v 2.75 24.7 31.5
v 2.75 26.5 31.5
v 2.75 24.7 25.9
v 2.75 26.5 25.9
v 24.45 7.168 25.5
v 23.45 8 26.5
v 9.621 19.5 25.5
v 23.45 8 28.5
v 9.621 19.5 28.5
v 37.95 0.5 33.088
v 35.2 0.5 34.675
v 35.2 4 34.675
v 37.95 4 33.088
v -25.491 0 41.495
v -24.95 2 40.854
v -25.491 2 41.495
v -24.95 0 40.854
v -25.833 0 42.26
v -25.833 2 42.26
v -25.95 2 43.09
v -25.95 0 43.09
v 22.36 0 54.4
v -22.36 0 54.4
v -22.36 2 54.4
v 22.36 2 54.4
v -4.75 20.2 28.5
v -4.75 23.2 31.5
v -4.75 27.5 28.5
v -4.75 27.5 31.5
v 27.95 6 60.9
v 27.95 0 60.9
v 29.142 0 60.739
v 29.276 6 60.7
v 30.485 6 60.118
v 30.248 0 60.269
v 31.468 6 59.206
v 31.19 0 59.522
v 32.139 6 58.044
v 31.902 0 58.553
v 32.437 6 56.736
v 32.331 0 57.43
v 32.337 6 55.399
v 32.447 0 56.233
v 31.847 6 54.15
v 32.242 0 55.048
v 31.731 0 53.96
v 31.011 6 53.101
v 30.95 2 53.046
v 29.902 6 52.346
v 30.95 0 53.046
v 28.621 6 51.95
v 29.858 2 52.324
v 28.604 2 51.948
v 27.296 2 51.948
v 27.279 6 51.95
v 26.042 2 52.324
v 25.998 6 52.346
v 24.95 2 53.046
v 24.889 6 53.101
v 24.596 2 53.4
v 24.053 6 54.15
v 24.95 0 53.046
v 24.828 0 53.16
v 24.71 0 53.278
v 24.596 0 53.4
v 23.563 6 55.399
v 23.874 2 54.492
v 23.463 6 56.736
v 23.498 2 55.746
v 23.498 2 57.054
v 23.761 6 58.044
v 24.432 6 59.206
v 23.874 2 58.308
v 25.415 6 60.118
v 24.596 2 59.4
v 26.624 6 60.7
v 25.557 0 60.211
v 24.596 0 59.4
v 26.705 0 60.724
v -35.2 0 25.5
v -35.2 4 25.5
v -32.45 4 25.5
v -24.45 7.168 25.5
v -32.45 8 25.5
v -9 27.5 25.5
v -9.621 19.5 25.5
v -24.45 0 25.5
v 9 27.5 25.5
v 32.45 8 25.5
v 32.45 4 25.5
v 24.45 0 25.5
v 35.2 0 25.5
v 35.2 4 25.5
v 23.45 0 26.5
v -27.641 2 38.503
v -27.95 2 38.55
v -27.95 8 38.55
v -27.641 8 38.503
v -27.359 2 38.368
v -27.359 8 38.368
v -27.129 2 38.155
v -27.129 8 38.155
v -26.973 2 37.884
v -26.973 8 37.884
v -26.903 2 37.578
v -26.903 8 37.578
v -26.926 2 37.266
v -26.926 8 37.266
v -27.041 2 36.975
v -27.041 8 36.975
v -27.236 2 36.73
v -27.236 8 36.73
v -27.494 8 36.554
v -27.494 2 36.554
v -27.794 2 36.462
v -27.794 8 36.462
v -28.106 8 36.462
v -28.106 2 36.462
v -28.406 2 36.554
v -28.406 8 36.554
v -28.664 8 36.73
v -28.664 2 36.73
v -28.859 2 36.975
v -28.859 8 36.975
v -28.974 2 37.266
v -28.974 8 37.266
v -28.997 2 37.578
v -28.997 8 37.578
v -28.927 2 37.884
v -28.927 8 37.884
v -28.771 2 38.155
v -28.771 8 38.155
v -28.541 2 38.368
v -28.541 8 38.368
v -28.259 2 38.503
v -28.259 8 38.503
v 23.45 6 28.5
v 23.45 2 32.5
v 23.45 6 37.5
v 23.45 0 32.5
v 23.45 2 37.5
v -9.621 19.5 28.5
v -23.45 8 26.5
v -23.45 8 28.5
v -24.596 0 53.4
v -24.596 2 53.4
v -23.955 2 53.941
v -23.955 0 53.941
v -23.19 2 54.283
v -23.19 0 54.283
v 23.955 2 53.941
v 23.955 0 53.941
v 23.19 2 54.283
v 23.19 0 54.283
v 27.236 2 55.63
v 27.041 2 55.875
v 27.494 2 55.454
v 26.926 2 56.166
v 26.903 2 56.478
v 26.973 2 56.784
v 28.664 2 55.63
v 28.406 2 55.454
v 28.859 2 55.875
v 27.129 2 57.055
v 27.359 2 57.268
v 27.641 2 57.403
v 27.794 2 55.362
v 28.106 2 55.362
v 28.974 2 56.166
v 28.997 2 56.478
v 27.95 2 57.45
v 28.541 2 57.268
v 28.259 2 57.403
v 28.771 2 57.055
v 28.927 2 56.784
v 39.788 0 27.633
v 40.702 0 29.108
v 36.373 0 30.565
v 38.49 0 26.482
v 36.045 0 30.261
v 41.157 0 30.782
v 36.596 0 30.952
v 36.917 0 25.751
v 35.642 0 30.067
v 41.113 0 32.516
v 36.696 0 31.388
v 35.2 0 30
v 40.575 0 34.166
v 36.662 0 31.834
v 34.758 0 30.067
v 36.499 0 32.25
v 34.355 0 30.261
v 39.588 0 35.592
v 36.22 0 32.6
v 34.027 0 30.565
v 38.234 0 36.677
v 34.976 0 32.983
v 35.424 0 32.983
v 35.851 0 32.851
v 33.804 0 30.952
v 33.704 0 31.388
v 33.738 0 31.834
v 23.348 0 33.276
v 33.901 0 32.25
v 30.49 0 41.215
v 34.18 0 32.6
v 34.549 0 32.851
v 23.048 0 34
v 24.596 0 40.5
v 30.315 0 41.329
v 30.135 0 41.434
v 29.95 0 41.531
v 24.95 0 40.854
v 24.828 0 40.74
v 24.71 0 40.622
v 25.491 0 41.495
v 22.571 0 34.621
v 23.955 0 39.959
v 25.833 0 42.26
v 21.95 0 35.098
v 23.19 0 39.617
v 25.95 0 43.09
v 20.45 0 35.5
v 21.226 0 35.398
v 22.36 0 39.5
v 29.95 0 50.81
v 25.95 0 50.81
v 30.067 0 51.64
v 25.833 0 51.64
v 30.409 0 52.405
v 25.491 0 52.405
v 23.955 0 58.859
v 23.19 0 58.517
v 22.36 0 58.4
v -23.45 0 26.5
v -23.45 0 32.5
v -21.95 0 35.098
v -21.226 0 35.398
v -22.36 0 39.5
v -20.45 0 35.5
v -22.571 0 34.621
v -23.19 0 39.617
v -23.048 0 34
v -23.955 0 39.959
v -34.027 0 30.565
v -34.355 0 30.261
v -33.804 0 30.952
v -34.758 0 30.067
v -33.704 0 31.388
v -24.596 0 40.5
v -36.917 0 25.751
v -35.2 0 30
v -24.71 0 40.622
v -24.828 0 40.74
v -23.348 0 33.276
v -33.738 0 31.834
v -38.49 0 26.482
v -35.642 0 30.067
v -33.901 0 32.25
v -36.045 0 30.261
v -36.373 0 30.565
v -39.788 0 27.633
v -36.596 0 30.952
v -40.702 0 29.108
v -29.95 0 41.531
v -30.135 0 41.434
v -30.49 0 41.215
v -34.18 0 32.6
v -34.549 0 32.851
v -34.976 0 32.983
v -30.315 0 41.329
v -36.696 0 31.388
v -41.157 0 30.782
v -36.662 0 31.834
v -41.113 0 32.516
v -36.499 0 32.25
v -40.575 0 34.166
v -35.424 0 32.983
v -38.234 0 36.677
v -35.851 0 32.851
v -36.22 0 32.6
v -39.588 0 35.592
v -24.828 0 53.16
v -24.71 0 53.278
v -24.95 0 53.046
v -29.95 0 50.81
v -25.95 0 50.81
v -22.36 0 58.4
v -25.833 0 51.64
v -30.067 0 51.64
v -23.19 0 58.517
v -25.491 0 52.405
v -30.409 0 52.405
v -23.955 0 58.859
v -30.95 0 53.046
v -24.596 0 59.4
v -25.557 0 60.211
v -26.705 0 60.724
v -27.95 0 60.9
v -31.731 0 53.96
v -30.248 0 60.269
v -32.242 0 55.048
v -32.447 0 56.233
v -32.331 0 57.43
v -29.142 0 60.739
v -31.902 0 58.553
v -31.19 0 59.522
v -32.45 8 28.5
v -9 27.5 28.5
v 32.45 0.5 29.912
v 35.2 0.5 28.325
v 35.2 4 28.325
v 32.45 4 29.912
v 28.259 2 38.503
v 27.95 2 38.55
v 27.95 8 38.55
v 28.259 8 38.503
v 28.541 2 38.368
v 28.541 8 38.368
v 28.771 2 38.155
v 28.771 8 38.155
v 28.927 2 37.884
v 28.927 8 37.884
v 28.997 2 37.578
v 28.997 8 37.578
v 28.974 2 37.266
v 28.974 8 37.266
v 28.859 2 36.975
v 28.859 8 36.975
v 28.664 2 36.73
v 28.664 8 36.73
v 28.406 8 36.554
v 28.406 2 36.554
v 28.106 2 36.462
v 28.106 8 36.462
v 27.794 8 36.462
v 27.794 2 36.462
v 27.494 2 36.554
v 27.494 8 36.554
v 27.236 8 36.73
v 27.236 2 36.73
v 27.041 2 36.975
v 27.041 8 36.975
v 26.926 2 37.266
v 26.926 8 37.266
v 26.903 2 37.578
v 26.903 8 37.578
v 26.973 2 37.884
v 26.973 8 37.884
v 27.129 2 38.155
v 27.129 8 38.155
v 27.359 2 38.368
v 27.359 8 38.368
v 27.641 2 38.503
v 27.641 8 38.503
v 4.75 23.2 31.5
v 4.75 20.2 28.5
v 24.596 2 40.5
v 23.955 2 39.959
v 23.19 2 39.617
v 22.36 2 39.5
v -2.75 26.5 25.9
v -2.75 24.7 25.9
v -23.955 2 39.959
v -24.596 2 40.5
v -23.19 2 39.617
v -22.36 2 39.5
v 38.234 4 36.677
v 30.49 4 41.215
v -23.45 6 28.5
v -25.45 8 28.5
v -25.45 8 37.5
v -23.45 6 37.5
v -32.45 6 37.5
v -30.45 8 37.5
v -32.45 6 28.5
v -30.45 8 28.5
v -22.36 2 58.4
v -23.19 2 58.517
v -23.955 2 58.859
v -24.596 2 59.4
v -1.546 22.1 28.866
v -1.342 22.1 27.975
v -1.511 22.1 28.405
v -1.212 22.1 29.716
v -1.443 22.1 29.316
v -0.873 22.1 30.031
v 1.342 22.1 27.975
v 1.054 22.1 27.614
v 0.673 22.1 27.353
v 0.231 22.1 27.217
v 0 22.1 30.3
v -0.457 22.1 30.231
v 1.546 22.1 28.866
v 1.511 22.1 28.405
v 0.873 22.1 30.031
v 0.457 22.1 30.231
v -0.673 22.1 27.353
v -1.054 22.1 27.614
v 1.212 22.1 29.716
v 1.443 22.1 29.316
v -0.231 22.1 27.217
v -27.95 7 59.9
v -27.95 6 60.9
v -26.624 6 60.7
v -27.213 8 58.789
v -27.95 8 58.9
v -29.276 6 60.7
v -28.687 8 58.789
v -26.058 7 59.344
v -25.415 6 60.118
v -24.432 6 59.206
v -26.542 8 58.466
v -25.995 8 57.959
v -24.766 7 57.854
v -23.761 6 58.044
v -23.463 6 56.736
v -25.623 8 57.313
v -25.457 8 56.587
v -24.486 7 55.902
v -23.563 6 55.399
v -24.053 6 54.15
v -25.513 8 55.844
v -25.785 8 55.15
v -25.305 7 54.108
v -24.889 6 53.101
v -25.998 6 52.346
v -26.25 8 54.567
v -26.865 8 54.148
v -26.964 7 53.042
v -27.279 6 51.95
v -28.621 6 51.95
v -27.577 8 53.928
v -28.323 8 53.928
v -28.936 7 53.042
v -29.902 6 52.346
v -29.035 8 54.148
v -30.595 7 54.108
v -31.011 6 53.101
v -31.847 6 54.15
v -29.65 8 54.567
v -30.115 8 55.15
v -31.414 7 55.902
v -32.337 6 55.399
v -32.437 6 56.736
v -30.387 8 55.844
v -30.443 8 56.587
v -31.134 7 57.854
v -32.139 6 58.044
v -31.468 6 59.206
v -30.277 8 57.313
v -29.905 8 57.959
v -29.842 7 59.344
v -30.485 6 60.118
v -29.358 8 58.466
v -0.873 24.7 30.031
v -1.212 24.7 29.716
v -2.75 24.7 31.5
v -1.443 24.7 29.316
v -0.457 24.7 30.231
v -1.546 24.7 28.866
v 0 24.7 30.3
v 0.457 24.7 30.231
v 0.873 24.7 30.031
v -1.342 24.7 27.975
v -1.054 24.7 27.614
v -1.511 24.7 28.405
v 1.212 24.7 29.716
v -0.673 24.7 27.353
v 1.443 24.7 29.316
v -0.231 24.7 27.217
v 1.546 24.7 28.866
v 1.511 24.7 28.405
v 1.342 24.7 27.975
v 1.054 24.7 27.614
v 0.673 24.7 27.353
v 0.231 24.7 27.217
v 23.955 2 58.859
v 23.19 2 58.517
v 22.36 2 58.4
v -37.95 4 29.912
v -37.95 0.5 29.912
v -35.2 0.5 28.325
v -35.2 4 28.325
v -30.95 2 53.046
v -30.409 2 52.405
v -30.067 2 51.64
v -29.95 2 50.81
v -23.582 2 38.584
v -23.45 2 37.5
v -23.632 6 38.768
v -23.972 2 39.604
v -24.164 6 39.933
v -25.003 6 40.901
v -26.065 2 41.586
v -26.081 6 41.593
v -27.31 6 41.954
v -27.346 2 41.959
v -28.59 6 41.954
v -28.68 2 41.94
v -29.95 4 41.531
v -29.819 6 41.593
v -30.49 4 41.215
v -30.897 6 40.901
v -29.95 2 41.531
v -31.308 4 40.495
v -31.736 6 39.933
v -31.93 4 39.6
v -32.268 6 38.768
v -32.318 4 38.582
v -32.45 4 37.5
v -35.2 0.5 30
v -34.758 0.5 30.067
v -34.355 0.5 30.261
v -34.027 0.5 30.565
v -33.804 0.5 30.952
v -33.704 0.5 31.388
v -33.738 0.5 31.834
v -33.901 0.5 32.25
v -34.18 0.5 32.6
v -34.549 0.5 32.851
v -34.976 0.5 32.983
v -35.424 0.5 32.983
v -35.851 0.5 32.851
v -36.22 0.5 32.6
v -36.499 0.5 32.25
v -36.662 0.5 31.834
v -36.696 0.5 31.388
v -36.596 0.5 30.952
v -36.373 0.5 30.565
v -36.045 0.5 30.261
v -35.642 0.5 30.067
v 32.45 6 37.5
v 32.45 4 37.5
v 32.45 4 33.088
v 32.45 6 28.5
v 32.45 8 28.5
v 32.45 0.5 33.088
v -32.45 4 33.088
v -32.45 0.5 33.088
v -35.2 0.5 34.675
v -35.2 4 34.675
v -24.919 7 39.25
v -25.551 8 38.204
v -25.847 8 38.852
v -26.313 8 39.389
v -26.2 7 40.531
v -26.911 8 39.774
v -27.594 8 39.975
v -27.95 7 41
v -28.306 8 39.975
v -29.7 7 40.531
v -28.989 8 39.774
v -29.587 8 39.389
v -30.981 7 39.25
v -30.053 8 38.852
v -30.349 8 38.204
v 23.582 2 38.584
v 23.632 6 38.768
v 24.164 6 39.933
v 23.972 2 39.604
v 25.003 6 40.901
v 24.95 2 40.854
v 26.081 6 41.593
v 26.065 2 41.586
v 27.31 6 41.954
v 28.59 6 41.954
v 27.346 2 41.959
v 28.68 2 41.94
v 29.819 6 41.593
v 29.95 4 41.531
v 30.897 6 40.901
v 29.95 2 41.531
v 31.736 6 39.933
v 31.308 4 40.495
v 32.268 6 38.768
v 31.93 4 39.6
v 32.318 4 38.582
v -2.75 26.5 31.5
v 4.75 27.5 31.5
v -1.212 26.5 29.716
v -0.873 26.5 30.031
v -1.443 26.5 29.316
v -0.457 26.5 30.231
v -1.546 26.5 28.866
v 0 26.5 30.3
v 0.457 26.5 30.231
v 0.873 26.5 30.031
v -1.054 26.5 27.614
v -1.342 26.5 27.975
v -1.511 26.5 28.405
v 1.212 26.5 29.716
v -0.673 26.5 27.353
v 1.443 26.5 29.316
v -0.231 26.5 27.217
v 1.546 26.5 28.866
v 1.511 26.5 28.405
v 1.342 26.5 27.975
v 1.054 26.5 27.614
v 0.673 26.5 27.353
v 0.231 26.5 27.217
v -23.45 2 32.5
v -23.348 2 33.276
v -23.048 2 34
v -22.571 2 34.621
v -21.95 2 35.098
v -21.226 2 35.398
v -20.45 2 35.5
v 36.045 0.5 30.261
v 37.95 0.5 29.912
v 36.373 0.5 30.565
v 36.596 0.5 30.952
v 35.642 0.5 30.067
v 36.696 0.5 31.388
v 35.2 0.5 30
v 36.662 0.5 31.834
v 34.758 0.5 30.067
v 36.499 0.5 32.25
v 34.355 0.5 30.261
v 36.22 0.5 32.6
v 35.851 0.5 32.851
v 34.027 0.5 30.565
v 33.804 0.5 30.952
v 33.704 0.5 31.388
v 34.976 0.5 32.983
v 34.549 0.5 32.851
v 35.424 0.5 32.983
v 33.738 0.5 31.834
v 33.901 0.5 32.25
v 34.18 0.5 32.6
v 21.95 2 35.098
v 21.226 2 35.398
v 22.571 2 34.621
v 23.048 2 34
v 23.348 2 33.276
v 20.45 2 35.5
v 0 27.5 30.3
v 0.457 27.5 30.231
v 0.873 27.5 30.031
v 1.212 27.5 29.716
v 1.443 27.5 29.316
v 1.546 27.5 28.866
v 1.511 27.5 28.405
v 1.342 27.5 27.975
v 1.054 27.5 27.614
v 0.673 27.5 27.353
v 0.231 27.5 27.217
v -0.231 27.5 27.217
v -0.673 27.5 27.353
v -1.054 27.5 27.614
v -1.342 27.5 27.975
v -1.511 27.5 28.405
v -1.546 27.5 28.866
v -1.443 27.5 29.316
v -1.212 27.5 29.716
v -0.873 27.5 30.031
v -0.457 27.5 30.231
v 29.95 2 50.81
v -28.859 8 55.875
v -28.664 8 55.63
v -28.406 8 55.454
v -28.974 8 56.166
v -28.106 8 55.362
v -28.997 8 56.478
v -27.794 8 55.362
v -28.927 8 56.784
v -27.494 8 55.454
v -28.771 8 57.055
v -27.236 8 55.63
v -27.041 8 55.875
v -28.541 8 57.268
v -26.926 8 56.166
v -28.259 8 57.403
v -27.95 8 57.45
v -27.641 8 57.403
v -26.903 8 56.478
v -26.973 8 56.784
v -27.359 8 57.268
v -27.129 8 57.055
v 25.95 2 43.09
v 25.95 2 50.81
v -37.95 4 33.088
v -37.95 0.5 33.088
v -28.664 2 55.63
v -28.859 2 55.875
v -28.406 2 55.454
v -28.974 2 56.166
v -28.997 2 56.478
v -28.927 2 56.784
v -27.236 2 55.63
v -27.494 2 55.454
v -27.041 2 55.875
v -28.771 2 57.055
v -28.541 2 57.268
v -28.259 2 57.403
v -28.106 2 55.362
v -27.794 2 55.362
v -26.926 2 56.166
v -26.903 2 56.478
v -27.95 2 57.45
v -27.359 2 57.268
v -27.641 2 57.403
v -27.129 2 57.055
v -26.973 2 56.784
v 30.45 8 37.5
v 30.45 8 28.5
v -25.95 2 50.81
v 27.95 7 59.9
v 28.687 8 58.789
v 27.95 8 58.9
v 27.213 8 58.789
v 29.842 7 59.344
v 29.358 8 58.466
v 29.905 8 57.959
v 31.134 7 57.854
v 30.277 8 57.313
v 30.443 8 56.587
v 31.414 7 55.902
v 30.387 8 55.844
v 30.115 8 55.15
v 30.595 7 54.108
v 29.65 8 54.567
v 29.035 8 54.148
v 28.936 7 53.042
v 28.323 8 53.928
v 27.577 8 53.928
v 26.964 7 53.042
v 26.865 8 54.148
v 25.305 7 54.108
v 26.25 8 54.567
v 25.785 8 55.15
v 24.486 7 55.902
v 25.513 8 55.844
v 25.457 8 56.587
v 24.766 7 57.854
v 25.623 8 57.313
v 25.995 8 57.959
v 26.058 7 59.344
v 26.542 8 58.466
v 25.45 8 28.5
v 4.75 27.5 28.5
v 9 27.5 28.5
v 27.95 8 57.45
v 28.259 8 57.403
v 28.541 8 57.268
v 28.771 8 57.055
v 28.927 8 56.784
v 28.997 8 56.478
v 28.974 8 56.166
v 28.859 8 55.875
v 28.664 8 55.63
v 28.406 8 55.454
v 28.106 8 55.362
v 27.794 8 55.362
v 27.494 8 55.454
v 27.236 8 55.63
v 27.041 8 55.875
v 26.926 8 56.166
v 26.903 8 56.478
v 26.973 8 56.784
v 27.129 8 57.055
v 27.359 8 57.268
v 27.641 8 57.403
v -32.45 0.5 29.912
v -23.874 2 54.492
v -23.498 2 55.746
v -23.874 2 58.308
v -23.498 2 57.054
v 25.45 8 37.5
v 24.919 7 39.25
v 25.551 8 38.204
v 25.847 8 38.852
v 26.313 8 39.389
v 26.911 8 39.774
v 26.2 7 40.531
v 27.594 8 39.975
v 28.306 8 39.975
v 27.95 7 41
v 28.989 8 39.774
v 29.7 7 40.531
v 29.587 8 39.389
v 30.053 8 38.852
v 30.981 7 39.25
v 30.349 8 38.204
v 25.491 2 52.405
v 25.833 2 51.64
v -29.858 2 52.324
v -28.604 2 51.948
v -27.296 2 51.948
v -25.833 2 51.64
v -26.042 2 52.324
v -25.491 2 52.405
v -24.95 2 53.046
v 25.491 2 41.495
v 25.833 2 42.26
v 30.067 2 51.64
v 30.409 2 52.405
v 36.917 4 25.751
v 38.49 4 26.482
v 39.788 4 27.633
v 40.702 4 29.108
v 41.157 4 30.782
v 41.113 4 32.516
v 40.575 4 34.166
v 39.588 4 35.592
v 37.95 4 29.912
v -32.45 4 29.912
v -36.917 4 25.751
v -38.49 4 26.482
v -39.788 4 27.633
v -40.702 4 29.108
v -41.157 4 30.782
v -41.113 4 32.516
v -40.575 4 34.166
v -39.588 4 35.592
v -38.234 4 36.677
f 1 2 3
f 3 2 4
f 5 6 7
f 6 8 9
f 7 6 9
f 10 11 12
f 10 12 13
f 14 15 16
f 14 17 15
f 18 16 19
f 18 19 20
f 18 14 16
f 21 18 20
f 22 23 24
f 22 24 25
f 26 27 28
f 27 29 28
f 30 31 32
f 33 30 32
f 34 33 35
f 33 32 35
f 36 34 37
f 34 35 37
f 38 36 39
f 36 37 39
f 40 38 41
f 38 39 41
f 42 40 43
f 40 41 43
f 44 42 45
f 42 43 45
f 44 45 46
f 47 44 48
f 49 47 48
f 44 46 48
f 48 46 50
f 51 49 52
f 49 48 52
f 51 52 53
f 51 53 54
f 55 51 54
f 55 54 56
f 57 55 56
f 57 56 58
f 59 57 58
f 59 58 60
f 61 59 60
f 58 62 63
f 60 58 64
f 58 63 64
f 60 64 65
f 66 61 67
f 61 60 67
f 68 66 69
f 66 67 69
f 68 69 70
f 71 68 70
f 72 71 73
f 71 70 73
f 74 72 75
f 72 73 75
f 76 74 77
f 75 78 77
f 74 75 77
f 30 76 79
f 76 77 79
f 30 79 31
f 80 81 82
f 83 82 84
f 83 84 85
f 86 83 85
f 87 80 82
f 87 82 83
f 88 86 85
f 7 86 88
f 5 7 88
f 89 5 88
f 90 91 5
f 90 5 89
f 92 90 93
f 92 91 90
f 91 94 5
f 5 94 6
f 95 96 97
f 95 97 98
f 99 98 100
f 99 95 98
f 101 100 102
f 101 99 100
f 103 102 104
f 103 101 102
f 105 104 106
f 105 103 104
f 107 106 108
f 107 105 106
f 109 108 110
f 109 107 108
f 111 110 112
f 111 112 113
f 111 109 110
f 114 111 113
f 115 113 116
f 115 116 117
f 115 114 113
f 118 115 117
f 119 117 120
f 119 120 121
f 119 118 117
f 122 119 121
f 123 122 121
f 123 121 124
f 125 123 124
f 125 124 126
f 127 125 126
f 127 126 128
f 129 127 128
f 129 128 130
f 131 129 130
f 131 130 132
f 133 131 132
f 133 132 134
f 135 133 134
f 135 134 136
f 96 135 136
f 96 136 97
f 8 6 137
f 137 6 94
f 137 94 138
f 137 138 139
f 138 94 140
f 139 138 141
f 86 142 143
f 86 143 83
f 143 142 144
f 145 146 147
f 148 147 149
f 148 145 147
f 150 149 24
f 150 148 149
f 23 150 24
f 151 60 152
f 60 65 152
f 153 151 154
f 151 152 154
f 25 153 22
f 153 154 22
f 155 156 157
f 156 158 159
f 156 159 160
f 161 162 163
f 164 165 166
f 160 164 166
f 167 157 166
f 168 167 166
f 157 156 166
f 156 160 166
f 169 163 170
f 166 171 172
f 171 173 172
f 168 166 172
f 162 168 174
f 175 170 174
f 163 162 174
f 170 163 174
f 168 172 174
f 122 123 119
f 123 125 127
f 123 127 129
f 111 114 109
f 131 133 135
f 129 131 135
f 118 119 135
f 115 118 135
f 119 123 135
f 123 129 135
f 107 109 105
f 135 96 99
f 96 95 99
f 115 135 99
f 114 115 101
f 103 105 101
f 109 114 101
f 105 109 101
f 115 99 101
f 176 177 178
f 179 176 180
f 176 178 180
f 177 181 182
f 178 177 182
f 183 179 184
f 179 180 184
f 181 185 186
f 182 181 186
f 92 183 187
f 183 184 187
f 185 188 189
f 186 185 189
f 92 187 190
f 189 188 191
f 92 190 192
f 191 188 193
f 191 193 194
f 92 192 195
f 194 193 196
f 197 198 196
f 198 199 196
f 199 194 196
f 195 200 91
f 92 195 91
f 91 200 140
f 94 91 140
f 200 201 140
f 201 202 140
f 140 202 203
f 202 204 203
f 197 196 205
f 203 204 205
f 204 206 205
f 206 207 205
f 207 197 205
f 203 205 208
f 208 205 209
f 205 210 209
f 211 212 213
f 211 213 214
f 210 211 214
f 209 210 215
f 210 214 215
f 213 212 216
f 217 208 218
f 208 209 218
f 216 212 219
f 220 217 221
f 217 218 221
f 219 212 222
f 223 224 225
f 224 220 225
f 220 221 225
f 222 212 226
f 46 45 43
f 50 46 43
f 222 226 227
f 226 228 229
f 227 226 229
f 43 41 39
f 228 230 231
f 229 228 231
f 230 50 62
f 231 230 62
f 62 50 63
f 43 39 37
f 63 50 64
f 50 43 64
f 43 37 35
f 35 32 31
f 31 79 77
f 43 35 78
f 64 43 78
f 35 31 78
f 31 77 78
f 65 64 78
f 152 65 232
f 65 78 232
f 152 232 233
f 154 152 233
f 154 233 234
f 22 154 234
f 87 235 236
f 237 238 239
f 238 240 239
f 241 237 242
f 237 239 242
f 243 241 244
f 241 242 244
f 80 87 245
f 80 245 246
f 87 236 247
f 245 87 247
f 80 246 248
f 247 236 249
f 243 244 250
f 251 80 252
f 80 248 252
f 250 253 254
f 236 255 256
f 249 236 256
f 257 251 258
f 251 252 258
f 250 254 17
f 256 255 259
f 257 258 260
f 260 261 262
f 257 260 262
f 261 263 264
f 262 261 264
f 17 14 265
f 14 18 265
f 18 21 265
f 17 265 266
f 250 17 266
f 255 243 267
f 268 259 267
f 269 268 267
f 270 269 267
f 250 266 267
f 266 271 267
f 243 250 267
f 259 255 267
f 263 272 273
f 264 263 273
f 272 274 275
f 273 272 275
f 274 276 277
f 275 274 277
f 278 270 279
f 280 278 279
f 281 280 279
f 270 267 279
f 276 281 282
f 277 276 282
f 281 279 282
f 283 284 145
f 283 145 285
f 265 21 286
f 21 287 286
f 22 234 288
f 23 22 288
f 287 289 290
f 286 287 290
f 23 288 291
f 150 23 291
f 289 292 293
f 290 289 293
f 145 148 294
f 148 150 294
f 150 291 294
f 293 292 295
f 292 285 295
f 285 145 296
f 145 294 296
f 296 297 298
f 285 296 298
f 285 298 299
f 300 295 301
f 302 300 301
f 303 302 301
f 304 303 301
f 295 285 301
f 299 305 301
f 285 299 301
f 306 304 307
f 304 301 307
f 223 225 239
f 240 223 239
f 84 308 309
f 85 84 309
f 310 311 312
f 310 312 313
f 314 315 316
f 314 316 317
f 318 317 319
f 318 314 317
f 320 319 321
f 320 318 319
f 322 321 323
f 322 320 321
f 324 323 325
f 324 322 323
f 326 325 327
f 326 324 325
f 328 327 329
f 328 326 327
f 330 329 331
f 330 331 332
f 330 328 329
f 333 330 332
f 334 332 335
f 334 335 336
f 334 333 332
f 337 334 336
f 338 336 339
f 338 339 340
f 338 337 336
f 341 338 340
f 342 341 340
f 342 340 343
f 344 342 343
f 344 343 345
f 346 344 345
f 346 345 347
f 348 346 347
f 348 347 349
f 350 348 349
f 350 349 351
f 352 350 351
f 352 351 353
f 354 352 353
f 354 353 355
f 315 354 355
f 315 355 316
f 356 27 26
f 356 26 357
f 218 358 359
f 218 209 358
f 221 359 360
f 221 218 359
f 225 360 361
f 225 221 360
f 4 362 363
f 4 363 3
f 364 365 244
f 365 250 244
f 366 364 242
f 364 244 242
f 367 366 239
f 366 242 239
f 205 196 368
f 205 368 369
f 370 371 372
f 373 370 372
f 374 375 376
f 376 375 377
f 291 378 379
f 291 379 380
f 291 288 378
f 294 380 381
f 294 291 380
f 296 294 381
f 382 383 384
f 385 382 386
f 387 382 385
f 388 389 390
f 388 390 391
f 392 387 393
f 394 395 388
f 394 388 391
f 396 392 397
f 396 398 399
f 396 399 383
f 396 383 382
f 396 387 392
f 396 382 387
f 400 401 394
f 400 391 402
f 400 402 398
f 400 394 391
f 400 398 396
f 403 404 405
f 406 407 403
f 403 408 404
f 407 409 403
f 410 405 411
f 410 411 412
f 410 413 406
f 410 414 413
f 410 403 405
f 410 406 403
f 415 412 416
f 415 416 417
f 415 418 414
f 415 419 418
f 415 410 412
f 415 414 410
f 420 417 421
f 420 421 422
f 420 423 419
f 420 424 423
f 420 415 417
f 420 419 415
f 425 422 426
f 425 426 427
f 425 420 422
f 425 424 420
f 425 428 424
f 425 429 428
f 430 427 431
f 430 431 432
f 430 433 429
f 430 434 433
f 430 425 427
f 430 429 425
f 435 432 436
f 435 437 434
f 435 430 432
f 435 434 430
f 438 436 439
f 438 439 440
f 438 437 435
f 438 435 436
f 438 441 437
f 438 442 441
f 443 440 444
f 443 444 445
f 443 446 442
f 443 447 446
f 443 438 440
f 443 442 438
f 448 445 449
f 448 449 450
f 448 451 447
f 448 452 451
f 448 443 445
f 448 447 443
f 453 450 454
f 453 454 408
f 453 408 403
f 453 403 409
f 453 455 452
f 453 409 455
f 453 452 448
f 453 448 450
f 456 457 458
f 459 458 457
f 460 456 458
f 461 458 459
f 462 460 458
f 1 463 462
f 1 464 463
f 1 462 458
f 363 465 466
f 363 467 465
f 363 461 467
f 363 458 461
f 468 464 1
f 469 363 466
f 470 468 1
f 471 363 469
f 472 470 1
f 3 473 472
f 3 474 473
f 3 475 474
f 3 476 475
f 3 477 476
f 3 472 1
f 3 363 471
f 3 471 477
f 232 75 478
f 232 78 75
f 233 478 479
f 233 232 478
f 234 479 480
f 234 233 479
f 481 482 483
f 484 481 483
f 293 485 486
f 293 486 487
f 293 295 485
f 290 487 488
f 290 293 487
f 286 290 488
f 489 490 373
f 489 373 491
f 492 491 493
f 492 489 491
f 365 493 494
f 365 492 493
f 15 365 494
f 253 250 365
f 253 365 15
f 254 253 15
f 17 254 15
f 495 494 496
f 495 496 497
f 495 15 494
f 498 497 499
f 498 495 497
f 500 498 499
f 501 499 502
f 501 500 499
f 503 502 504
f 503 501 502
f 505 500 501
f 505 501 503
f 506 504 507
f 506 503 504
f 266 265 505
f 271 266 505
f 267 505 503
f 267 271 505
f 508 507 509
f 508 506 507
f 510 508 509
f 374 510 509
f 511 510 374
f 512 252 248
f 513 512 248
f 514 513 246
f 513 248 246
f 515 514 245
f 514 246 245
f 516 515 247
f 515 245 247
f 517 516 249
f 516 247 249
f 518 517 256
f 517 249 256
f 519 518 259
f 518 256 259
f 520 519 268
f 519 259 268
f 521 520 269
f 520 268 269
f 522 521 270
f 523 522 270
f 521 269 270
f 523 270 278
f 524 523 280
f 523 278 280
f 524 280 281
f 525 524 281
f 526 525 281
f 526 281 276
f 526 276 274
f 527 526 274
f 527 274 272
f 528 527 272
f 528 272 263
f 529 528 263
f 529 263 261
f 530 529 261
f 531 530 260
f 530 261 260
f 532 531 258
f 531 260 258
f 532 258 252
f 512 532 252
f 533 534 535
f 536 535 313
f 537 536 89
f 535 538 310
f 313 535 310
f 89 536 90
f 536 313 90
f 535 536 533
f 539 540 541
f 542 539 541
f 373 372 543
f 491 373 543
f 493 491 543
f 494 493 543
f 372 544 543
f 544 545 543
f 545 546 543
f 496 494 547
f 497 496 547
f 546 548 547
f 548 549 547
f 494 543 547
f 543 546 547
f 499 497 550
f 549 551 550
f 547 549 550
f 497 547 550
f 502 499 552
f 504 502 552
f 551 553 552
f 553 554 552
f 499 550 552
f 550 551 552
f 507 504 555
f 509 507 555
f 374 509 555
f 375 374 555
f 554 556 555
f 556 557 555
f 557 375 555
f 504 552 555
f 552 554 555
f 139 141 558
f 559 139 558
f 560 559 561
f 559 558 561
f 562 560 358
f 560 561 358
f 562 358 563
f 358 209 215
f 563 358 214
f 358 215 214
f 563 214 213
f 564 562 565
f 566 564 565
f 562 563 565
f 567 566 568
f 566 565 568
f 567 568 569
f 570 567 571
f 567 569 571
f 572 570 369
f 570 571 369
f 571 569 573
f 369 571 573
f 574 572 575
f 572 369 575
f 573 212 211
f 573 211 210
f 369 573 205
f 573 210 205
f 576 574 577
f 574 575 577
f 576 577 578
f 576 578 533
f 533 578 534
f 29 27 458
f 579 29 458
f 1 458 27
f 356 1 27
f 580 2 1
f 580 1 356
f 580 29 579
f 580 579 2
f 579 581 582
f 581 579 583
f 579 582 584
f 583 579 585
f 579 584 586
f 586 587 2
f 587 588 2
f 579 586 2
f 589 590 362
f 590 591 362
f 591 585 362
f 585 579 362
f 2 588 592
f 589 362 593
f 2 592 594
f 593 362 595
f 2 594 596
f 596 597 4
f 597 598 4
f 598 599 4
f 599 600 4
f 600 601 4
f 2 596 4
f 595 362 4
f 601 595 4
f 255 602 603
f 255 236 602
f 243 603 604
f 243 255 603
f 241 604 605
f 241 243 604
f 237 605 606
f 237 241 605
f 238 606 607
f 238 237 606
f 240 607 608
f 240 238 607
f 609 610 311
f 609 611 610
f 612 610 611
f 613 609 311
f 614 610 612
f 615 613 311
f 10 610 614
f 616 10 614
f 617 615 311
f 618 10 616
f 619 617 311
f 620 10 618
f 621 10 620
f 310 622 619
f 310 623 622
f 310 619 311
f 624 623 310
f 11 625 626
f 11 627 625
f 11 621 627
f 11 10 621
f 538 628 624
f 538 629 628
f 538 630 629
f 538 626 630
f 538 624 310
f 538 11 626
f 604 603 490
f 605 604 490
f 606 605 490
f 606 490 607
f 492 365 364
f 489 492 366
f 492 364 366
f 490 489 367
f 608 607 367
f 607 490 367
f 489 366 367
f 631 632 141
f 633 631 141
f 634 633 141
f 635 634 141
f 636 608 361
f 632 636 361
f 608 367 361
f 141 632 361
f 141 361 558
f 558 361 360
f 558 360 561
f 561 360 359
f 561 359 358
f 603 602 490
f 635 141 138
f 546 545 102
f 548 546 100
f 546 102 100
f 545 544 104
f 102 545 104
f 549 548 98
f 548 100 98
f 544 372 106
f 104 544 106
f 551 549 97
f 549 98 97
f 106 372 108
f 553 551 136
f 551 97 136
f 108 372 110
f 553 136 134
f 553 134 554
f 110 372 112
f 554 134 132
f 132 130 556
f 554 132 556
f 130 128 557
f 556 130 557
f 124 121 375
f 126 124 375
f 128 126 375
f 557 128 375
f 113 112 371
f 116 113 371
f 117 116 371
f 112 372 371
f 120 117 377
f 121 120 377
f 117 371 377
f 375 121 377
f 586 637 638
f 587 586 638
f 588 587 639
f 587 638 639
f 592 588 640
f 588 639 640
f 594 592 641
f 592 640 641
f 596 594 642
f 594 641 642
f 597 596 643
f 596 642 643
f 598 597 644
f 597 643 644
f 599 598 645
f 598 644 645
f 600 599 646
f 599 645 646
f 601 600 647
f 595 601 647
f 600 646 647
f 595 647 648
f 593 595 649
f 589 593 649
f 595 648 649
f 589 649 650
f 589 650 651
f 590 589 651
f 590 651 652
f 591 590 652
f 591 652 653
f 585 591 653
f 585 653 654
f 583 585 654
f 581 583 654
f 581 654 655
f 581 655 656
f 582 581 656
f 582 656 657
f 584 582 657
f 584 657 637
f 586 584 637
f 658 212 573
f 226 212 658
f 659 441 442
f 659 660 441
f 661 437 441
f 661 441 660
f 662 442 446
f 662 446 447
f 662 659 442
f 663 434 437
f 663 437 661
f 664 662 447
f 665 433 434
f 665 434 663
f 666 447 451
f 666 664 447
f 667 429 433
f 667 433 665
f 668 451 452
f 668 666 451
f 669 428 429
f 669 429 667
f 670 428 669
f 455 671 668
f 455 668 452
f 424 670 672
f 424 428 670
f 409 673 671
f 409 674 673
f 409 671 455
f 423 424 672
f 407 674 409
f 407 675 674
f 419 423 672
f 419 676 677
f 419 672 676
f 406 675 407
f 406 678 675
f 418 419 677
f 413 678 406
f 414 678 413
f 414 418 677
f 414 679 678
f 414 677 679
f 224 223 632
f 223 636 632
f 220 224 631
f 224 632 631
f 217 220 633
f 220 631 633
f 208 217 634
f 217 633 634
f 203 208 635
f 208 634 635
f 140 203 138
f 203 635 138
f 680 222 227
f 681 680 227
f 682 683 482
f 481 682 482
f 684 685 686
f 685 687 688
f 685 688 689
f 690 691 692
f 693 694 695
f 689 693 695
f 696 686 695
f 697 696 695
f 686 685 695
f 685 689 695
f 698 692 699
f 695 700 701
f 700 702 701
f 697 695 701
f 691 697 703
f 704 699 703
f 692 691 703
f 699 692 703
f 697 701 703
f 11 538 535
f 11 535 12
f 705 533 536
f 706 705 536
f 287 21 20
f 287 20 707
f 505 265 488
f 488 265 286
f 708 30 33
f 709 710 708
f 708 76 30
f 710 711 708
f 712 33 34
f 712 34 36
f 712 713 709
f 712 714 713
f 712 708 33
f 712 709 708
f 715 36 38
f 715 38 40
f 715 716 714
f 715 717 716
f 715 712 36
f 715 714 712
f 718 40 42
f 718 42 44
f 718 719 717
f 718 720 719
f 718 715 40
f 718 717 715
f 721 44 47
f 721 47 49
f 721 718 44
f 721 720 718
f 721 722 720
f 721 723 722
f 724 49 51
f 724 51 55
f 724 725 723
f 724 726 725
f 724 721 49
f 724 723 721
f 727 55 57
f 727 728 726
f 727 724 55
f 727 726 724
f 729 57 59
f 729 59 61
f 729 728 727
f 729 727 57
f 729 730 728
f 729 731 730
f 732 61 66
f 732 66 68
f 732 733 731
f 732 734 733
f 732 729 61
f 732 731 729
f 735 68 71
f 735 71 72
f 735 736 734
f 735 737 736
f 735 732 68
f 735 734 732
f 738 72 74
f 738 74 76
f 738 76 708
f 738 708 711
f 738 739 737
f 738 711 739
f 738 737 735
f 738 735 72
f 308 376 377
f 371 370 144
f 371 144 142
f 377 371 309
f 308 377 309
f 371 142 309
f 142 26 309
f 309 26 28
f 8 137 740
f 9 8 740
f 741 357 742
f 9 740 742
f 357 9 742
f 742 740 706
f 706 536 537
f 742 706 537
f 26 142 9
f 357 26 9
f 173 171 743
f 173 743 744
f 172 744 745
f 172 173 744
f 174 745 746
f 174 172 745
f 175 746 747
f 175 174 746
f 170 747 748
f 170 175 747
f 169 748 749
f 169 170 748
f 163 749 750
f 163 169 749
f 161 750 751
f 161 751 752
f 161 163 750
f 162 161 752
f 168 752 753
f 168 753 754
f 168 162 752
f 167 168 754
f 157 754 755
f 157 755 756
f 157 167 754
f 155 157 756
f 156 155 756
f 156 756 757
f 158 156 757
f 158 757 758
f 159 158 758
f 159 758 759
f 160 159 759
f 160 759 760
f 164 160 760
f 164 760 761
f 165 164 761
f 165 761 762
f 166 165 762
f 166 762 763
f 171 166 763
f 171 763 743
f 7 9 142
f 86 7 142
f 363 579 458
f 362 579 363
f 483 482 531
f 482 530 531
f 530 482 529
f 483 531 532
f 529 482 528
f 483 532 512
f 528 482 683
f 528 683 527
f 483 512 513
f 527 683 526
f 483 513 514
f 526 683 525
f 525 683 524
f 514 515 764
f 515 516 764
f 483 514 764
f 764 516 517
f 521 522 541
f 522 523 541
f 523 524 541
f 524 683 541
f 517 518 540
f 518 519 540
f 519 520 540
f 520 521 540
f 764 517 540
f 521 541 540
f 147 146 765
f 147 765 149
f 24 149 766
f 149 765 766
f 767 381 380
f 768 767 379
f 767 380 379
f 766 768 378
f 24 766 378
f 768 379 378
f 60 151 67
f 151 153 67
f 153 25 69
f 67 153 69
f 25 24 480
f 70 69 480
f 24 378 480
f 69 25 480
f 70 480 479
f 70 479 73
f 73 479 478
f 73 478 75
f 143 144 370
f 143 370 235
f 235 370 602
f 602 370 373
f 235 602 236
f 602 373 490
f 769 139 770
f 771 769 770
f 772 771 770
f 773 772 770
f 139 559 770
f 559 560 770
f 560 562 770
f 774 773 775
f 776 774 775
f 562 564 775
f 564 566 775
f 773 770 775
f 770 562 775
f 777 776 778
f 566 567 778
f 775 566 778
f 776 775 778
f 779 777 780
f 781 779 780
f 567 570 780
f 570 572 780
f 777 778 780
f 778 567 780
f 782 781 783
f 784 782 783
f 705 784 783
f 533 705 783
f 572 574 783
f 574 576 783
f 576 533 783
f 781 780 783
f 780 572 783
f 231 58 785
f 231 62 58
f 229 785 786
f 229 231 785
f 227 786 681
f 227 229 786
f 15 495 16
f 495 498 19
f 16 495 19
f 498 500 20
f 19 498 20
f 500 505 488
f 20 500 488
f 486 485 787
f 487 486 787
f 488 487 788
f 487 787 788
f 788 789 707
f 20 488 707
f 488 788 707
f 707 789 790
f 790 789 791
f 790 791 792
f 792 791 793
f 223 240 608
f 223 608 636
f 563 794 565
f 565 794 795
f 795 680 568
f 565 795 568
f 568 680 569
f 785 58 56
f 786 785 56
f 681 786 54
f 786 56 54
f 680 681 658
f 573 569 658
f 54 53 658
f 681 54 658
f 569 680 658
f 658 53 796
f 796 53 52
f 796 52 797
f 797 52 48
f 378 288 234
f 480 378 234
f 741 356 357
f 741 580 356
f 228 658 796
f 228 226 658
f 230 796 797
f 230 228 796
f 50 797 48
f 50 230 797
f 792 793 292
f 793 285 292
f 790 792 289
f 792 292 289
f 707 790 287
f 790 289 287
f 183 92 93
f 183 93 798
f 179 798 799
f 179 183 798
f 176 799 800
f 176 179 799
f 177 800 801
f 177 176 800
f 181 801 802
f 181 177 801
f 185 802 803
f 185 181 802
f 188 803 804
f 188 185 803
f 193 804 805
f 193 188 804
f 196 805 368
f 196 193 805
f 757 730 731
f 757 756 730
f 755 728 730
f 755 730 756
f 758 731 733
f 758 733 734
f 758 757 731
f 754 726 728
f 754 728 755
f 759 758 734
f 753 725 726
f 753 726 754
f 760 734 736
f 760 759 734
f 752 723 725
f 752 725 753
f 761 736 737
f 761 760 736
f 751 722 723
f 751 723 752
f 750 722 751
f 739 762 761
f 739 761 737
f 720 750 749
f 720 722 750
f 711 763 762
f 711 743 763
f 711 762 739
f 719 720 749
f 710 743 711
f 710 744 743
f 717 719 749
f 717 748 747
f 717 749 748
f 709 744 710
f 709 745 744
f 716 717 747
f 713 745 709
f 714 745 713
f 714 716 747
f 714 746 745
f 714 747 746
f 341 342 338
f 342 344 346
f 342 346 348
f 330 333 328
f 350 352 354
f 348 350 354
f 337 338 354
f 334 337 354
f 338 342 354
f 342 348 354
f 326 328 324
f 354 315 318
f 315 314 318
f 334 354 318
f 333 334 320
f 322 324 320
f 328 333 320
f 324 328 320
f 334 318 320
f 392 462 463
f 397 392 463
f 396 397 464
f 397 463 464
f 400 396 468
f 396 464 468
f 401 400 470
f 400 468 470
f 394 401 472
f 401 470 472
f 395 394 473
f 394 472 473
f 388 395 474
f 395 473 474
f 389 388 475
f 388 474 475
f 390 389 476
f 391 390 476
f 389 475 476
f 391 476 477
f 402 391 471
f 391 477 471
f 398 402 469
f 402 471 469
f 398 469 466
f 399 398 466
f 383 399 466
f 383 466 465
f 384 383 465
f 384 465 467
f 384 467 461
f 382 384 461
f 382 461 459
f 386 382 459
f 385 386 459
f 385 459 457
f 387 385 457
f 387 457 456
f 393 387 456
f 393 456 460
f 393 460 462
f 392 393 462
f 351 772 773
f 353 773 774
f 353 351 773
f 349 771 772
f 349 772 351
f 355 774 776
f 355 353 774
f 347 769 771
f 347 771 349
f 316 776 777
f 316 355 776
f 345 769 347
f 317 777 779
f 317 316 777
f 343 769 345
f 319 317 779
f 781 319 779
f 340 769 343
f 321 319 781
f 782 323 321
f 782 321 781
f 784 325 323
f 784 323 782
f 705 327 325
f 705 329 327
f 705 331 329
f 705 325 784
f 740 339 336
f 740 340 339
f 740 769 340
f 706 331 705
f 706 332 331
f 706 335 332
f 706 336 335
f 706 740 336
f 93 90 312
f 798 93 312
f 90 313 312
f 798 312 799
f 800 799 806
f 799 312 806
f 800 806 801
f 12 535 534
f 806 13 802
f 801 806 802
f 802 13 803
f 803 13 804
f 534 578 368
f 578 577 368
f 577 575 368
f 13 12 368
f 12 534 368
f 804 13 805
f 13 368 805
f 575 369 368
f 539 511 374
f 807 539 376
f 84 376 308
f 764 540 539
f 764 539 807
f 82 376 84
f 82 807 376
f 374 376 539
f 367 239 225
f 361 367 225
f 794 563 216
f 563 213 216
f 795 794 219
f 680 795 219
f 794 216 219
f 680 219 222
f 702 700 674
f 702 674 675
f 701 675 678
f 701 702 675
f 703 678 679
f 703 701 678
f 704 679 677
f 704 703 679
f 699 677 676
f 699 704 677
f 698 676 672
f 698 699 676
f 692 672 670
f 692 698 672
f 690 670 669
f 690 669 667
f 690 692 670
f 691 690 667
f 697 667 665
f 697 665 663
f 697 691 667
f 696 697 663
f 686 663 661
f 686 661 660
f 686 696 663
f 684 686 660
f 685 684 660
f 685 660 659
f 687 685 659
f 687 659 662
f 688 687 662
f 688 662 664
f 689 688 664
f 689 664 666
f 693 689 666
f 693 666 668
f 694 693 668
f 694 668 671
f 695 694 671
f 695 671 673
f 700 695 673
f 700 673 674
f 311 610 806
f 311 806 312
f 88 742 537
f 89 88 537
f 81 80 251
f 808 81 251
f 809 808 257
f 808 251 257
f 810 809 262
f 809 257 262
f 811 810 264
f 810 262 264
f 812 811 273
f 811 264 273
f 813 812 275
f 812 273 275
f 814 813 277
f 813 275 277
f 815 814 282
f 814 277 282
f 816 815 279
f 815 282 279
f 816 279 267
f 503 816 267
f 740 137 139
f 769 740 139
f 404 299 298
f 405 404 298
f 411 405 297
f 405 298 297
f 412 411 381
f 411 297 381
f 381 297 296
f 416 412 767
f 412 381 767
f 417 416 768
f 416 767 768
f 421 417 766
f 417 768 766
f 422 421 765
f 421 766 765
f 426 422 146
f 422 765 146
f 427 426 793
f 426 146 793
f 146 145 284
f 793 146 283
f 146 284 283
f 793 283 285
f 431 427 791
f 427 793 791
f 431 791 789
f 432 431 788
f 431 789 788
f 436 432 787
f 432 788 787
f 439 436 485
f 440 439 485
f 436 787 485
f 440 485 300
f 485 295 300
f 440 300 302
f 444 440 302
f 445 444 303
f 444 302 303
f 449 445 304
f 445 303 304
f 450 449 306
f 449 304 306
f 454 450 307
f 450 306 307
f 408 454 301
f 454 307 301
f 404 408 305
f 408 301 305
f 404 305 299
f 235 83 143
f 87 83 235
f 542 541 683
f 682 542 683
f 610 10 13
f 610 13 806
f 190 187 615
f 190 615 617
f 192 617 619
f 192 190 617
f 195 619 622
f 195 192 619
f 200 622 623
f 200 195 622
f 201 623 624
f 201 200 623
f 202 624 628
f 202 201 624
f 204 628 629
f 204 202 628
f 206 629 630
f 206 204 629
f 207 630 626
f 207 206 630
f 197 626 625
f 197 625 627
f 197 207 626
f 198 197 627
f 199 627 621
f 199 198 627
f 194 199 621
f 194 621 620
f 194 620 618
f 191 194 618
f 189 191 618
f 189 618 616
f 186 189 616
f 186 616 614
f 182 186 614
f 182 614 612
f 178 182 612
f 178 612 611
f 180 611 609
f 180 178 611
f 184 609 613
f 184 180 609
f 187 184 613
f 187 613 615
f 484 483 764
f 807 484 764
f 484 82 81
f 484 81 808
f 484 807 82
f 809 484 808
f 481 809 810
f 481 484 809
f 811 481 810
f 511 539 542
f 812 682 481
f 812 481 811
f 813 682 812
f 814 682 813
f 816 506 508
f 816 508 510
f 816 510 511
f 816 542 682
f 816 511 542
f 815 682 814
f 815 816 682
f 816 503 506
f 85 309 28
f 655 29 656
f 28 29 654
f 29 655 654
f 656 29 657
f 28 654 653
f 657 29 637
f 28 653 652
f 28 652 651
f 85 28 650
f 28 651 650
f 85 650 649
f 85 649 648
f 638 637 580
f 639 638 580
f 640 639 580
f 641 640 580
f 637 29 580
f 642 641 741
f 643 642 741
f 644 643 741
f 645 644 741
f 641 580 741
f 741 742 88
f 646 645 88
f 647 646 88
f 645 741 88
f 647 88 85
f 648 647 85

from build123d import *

# Parameters (mm, degrees)
SKETCH1_R             = 4.5
SKETCH1_R_2           = 1.05
BOSS_EXTRUDE1_DEPTH   = 8
BOSS_EXTRUDE1_2_DEPTH = 8
BOSS_EXTRUDE1_3_DEPTH = 8
BOSS_EXTRUDE1_4_DEPTH = 8
BOSS_EXTRUDE2_REACH   = 91.358
SKETCH2_W             = 3
SKETCH2_H             = 27.5
CUT_EXTRUDE1_DEPTH    = 54.46973443
SKETCH4_W             = 59.9
SKETCH4_H             = 22.9
SKETCH4_W_2           = 51.9
SKETCH4_H_2           = 14.9
BOSS_EXTRUDE3_DEPTH   = 2
SKETCH7_W             = 9.5
SKETCH7_H             = 3
BOSS_EXTRUDE5_DEPTH   = 4.3
CUT_EXTRUDE3_START    = -1
SKETCH8_W             = 5.5
SKETCH8_H             = 5.5
CUT_EXTRUDE3_DEPTH    = 1.8
CHAMFER3_SIZE         = 3
SKETCH9_R             = 1.55
CUT_EXTRUDE4_DEPTH    = 5.4
BOSS_EXTRUDE6_DEPTH   = 4
SKETCH11_R            = 1.5
BOSS_EXTRUDE7_DEPTH   = 0.5
FILLET2_R             = 3
CHAMFER4_SIZE         = 1
CHAMFER5_SIZE         = 2
SKETCH12_W            = 5.5
SKETCH12_H            = 1.8
CUT_EXTRUDE5_DEPTH    = 0.1


with BuildPart() as part:
    # Sketch1 → Boss-Extrude1 (new body)
    with BuildSketch(Plane(origin=(0, 0, 0), x_dir=(1, 0, 0), z_dir=(0, 1, 0))):
        with Locations(Location((27.95, -56.4, 0), (0, 0, 270))):
            Circle(SKETCH1_R)
        with Locations(Location((27.95, -56.4, 0), (0, 0, 270))):
            Circle(SKETCH1_R_2, mode=Mode.SUBTRACT)
    extrude(amount=BOSS_EXTRUDE1_DEPTH)



with BuildPart() as body_2:
    # Sketch1 → Boss-Extrude1 2 (new body)
    with BuildSketch(Plane(origin=(0, 0, 0), x_dir=(1, 0, 0), z_dir=(0, 1, 0))):
        with Locations(Location((-27.95, -56.4, 0), (0, 0, 270))):
            Circle(SKETCH1_R)
        with Locations(Location((-27.95, -56.4, 0), (0, 0, 270))):
            Circle(SKETCH1_R_2, mode=Mode.SUBTRACT)
    extrude(amount=BOSS_EXTRUDE1_2_DEPTH)


with BuildPart() as body_3:
    # Sketch1 → Boss-Extrude1 3 (new body)
    with BuildSketch(Plane(origin=(0, 0, 0), x_dir=(1, 0, 0), z_dir=(0, 1, 0))):
        with BuildLine():
            Line((-32.45, -37.5), (-32.45, -25.5))
            Line((-32.45, -25.5), (-23.45, -25.5))
            Line((-23.45, -25.5), (-23.45, -37.5))
            ThreePointArc((-23.45, -37.5), (-27.95, -42), (-32.45, -37.5))
        make_face()
        with Locations(Location((-27.95, -37.5, 0), (0, 0, 270))):
            Circle(SKETCH1_R_2, mode=Mode.SUBTRACT)
    extrude(amount=BOSS_EXTRUDE1_3_DEPTH)

    # Boss-Extrude2: up to this face of the body (flat: up to its plane)
    boss_extrude2_end = Plane(body_3.part.faces().sort_by_distance((-32.45, 4, 31.5))[0])
    # Sketch2 → Boss-Extrude2 (add, up to the picked face)
    with BuildSketch(Plane(origin=(32.45, 0, 0), x_dir=(0, 0, -1), z_dir=(1, 0, 0)), mode=Mode.PRIVATE) as boss_extrude2_sk1:
        with Locations((-27, 13.75)):
            Rectangle(SKETCH2_W, SKETCH2_H)
    boss_extrude2_tool1 = split(extrude(boss_extrude2_sk1.sketch, amount=-BOSS_EXTRUDE2_REACH, mode=Mode.PRIVATE), bisect_by=boss_extrude2_end, keep=Keep.BOTH, mode=Mode.PRIVATE)


with BuildPart() as body_4:
    # Sketch1 → Boss-Extrude1 4 (new body)
    with BuildSketch(Plane(origin=(0, 0, 0), x_dir=(1, 0, 0), z_dir=(0, 1, 0))):
        with BuildLine():
            Line((32.45, -37.5), (32.45, -25.5))
            Line((32.45, -25.5), (23.45, -25.5))
            Line((23.45, -25.5), (23.45, -37.5))
            ThreePointArc((23.45, -37.5), (27.95, -42), (32.45, -37.5))
        make_face()
        with Locations(Location((27.95, -37.5, 0), (0, 0, 270))):
            Circle(SKETCH1_R_2, mode=Mode.SUBTRACT)
    extrude(amount=BOSS_EXTRUDE1_4_DEPTH)


with BuildPart() as body_3_1:
    add(body_3.part)

    add(body_4.part)  # Boss-Extrude2 merges body 4
    add(boss_extrude2_tool1.solids().sort_by(Axis((32.45, 13.75, 27), (-1, 0, 0)))[0])

    # Sketch3 → Cut-Extrude1 (cut, through all)
    with BuildSketch(Plane.XY.offset(28.5)):
        Polygon((-32.45, 8), (-9, 27.5), (-32.45, 27.5), align=None)
        Polygon((9, 27.5), (32.45, 8), (32.45, 27.5), align=None)
        Polygon((-23.45, 8), (-23.45, 0), (23.45, 0), (23.45, 8), (9.620512821, 19.5), (-9.620512821, 19.5), align=None)
    extrude(amount=-CUT_EXTRUDE1_DEPTH, mode=Mode.SUBTRACT)


with BuildPart() as part_1:
    add(part.part)

    add(body_2.part)  # Boss-Extrude3 merges body 2

    add(body_3_1.part)  # Boss-Extrude3 merges body 3
    # Sketch4 → Boss-Extrude3 (add)
    with BuildSketch(Plane.XZ):
        with Locations((0, 46.95)):
            Rectangle(SKETCH4_W, SKETCH4_H)
        with Locations((0, 46.95)):
            Rectangle(SKETCH4_W_2, SKETCH4_H_2, mode=Mode.SUBTRACT)
    extrude(amount=-BOSS_EXTRUDE3_DEPTH)

    # Sketch7 → Boss-Extrude5 (add)
    with BuildSketch(Plane(origin=(0, 27.5, 0), x_dir=(1, 0, 0), z_dir=(0, 1, 0))):
        with Locations((0, -30)):
            Rectangle(SKETCH7_W, SKETCH7_H)
    extrude(amount=-BOSS_EXTRUDE5_DEPTH)

    # Sketch8 → Cut-Extrude3 (cut)
    with BuildSketch(Plane(origin=(0, 27.5, 0), x_dir=(1, 0, 0), z_dir=(0, 1, 0)).offset(CUT_EXTRUDE3_START)):
        with Locations((0, -28.75)):
            Rectangle(SKETCH8_W, SKETCH8_H)
    extrude(amount=-CUT_EXTRUDE3_DEPTH, mode=Mode.SUBTRACT)

    # Chamfer3
    chamfer3_edges = [part_1.edges().sort_by_distance(p)[0] for p in [
        (0, 23.2, 28.5),
    ]]
    chamfer(chamfer3_edges, length=CHAMFER3_SIZE - 0.0001)  # a hair under: the kernel refuses the full size

    # Sketch9 → Cut-Extrude4 (cut)
    with BuildSketch(Plane(origin=(0, 27.5, 0), x_dir=(1, 0, 0), z_dir=(0, 1, 0))):
        with Locations(Location((0, -28.75, 0), (0, 0, 270))):
            Circle(SKETCH9_R)
    extrude(amount=-CUT_EXTRUDE4_DEPTH, mode=Mode.SUBTRACT)

    # Sketch10 → Boss-Extrude6 (add)
    with BuildSketch(Plane.XZ):
        with BuildLine():
            Line((-32.45, 25.5), (-35.2, 25.5))
            ThreePointArc((-35.2, 25.5), (-40.990483074, 29.928279361), (-38.233673919, 36.676564744))
            Line((-38.233673919, 36.676564744), (-29.95, 41.531128874))
            Line((-29.95, 41.531128874), (-29.95, 25.5))
            Line((-29.95, 25.5), (-32.45, 25.5))
        make_face()
        Polygon((-35.2, 28.324573519), (-32.45, 29.91228676), (-32.45, 33.08771324), (-35.2, 34.675426481), (-37.95, 33.08771324), (-37.95, 29.91228676), align=None, mode=Mode.SUBTRACT)
    boss_extrude6 = extrude(amount=-BOSS_EXTRUDE6_DEPTH)

    # Sketch11 → Boss-Extrude7 (add)
    with BuildSketch(Plane.XZ):
        Polygon((-37.95, 33.08771324), (-37.95, 29.91228676), (-35.2, 28.324573519), (-32.45, 29.91228676), (-32.45, 33.08771324), (-35.2, 34.675426481), align=None)
        with Locations(Location((-35.2, 31.5, 0), (0, 0, 270))):
            Circle(SKETCH11_R, mode=Mode.SUBTRACT)
    boss_extrude7 = extrude(amount=-BOSS_EXTRUDE7_DEPTH)

    # Mirror1: Boss-Extrude6, Boss-Extrude7 across plane
    add(boss_extrude6.mirror(Plane(origin=(0, 0, 0), x_dir=(0, 0, 1), z_dir=(1, 0, 0))))
    add(boss_extrude7.mirror(Plane(origin=(0, 0, 0), x_dir=(0, 0, 1), z_dir=(1, 0, 0))))

    # Fillet2
    fillet2_edges = [part_1.edges().sort_by_distance(p)[0] for p in [
        (23.918871126, 1, 58.4),
        (-25.95, 1, 52.368871126),
        (-23.918871126, 1, 58.4),
        (-29.95, 1, 52.368871126),
        (-23.918871126, 1, 54.4),
        (23.918871126, 1, 39.5),
        (-23.918871126, 1, 39.5),
        (23.45, 1, 35.5),
        (-23.45, 1, 35.5),
        (25.95, 1, 52.368871126),
        (-25.95, 1, 41.531128874),
        (29.95, 1, 52.368871126),
        (25.95, 1, 41.531128874),
        (23.918871126, 1, 54.4),
    ]]
    fillet(fillet2_edges, radius=FILLET2_R)

    # Chamfer4
    chamfer4_edges = [part_1.edges().sort_by_distance(p)[0] for p in [
        (23.45, 4, 25.5),
        (-23.45, 4, 25.5),
    ]]
    chamfer(chamfer4_edges, length=CHAMFER4_SIZE)

    # Chamfer5
    chamfer5_edges = [part_1.edges().sort_by_distance(p)[0] for p in [
        (27.95, 8, 51.9),
        (-27.95, 8, 51.9),
        (-32.45, 8, 33),
        (-27.95, 8, 42),
        (-23.45, 8, 33),
        (23.45, 8, 33),
        (27.95, 8, 42),
        (32.45, 8, 33),
    ]]
    chamfer(chamfer5_edges, length=CHAMFER5_SIZE)

    # Sketch12 → Cut-Extrude5 (cut)
    with BuildSketch(Plane.XY.offset(26)):
        with Locations((0, 25.6)):
            Rectangle(SKETCH12_W, SKETCH12_H)
    extrude(amount=-CUT_EXTRUDE5_DEPTH, mode=Mode.SUBTRACT)


solid = part_1.part
